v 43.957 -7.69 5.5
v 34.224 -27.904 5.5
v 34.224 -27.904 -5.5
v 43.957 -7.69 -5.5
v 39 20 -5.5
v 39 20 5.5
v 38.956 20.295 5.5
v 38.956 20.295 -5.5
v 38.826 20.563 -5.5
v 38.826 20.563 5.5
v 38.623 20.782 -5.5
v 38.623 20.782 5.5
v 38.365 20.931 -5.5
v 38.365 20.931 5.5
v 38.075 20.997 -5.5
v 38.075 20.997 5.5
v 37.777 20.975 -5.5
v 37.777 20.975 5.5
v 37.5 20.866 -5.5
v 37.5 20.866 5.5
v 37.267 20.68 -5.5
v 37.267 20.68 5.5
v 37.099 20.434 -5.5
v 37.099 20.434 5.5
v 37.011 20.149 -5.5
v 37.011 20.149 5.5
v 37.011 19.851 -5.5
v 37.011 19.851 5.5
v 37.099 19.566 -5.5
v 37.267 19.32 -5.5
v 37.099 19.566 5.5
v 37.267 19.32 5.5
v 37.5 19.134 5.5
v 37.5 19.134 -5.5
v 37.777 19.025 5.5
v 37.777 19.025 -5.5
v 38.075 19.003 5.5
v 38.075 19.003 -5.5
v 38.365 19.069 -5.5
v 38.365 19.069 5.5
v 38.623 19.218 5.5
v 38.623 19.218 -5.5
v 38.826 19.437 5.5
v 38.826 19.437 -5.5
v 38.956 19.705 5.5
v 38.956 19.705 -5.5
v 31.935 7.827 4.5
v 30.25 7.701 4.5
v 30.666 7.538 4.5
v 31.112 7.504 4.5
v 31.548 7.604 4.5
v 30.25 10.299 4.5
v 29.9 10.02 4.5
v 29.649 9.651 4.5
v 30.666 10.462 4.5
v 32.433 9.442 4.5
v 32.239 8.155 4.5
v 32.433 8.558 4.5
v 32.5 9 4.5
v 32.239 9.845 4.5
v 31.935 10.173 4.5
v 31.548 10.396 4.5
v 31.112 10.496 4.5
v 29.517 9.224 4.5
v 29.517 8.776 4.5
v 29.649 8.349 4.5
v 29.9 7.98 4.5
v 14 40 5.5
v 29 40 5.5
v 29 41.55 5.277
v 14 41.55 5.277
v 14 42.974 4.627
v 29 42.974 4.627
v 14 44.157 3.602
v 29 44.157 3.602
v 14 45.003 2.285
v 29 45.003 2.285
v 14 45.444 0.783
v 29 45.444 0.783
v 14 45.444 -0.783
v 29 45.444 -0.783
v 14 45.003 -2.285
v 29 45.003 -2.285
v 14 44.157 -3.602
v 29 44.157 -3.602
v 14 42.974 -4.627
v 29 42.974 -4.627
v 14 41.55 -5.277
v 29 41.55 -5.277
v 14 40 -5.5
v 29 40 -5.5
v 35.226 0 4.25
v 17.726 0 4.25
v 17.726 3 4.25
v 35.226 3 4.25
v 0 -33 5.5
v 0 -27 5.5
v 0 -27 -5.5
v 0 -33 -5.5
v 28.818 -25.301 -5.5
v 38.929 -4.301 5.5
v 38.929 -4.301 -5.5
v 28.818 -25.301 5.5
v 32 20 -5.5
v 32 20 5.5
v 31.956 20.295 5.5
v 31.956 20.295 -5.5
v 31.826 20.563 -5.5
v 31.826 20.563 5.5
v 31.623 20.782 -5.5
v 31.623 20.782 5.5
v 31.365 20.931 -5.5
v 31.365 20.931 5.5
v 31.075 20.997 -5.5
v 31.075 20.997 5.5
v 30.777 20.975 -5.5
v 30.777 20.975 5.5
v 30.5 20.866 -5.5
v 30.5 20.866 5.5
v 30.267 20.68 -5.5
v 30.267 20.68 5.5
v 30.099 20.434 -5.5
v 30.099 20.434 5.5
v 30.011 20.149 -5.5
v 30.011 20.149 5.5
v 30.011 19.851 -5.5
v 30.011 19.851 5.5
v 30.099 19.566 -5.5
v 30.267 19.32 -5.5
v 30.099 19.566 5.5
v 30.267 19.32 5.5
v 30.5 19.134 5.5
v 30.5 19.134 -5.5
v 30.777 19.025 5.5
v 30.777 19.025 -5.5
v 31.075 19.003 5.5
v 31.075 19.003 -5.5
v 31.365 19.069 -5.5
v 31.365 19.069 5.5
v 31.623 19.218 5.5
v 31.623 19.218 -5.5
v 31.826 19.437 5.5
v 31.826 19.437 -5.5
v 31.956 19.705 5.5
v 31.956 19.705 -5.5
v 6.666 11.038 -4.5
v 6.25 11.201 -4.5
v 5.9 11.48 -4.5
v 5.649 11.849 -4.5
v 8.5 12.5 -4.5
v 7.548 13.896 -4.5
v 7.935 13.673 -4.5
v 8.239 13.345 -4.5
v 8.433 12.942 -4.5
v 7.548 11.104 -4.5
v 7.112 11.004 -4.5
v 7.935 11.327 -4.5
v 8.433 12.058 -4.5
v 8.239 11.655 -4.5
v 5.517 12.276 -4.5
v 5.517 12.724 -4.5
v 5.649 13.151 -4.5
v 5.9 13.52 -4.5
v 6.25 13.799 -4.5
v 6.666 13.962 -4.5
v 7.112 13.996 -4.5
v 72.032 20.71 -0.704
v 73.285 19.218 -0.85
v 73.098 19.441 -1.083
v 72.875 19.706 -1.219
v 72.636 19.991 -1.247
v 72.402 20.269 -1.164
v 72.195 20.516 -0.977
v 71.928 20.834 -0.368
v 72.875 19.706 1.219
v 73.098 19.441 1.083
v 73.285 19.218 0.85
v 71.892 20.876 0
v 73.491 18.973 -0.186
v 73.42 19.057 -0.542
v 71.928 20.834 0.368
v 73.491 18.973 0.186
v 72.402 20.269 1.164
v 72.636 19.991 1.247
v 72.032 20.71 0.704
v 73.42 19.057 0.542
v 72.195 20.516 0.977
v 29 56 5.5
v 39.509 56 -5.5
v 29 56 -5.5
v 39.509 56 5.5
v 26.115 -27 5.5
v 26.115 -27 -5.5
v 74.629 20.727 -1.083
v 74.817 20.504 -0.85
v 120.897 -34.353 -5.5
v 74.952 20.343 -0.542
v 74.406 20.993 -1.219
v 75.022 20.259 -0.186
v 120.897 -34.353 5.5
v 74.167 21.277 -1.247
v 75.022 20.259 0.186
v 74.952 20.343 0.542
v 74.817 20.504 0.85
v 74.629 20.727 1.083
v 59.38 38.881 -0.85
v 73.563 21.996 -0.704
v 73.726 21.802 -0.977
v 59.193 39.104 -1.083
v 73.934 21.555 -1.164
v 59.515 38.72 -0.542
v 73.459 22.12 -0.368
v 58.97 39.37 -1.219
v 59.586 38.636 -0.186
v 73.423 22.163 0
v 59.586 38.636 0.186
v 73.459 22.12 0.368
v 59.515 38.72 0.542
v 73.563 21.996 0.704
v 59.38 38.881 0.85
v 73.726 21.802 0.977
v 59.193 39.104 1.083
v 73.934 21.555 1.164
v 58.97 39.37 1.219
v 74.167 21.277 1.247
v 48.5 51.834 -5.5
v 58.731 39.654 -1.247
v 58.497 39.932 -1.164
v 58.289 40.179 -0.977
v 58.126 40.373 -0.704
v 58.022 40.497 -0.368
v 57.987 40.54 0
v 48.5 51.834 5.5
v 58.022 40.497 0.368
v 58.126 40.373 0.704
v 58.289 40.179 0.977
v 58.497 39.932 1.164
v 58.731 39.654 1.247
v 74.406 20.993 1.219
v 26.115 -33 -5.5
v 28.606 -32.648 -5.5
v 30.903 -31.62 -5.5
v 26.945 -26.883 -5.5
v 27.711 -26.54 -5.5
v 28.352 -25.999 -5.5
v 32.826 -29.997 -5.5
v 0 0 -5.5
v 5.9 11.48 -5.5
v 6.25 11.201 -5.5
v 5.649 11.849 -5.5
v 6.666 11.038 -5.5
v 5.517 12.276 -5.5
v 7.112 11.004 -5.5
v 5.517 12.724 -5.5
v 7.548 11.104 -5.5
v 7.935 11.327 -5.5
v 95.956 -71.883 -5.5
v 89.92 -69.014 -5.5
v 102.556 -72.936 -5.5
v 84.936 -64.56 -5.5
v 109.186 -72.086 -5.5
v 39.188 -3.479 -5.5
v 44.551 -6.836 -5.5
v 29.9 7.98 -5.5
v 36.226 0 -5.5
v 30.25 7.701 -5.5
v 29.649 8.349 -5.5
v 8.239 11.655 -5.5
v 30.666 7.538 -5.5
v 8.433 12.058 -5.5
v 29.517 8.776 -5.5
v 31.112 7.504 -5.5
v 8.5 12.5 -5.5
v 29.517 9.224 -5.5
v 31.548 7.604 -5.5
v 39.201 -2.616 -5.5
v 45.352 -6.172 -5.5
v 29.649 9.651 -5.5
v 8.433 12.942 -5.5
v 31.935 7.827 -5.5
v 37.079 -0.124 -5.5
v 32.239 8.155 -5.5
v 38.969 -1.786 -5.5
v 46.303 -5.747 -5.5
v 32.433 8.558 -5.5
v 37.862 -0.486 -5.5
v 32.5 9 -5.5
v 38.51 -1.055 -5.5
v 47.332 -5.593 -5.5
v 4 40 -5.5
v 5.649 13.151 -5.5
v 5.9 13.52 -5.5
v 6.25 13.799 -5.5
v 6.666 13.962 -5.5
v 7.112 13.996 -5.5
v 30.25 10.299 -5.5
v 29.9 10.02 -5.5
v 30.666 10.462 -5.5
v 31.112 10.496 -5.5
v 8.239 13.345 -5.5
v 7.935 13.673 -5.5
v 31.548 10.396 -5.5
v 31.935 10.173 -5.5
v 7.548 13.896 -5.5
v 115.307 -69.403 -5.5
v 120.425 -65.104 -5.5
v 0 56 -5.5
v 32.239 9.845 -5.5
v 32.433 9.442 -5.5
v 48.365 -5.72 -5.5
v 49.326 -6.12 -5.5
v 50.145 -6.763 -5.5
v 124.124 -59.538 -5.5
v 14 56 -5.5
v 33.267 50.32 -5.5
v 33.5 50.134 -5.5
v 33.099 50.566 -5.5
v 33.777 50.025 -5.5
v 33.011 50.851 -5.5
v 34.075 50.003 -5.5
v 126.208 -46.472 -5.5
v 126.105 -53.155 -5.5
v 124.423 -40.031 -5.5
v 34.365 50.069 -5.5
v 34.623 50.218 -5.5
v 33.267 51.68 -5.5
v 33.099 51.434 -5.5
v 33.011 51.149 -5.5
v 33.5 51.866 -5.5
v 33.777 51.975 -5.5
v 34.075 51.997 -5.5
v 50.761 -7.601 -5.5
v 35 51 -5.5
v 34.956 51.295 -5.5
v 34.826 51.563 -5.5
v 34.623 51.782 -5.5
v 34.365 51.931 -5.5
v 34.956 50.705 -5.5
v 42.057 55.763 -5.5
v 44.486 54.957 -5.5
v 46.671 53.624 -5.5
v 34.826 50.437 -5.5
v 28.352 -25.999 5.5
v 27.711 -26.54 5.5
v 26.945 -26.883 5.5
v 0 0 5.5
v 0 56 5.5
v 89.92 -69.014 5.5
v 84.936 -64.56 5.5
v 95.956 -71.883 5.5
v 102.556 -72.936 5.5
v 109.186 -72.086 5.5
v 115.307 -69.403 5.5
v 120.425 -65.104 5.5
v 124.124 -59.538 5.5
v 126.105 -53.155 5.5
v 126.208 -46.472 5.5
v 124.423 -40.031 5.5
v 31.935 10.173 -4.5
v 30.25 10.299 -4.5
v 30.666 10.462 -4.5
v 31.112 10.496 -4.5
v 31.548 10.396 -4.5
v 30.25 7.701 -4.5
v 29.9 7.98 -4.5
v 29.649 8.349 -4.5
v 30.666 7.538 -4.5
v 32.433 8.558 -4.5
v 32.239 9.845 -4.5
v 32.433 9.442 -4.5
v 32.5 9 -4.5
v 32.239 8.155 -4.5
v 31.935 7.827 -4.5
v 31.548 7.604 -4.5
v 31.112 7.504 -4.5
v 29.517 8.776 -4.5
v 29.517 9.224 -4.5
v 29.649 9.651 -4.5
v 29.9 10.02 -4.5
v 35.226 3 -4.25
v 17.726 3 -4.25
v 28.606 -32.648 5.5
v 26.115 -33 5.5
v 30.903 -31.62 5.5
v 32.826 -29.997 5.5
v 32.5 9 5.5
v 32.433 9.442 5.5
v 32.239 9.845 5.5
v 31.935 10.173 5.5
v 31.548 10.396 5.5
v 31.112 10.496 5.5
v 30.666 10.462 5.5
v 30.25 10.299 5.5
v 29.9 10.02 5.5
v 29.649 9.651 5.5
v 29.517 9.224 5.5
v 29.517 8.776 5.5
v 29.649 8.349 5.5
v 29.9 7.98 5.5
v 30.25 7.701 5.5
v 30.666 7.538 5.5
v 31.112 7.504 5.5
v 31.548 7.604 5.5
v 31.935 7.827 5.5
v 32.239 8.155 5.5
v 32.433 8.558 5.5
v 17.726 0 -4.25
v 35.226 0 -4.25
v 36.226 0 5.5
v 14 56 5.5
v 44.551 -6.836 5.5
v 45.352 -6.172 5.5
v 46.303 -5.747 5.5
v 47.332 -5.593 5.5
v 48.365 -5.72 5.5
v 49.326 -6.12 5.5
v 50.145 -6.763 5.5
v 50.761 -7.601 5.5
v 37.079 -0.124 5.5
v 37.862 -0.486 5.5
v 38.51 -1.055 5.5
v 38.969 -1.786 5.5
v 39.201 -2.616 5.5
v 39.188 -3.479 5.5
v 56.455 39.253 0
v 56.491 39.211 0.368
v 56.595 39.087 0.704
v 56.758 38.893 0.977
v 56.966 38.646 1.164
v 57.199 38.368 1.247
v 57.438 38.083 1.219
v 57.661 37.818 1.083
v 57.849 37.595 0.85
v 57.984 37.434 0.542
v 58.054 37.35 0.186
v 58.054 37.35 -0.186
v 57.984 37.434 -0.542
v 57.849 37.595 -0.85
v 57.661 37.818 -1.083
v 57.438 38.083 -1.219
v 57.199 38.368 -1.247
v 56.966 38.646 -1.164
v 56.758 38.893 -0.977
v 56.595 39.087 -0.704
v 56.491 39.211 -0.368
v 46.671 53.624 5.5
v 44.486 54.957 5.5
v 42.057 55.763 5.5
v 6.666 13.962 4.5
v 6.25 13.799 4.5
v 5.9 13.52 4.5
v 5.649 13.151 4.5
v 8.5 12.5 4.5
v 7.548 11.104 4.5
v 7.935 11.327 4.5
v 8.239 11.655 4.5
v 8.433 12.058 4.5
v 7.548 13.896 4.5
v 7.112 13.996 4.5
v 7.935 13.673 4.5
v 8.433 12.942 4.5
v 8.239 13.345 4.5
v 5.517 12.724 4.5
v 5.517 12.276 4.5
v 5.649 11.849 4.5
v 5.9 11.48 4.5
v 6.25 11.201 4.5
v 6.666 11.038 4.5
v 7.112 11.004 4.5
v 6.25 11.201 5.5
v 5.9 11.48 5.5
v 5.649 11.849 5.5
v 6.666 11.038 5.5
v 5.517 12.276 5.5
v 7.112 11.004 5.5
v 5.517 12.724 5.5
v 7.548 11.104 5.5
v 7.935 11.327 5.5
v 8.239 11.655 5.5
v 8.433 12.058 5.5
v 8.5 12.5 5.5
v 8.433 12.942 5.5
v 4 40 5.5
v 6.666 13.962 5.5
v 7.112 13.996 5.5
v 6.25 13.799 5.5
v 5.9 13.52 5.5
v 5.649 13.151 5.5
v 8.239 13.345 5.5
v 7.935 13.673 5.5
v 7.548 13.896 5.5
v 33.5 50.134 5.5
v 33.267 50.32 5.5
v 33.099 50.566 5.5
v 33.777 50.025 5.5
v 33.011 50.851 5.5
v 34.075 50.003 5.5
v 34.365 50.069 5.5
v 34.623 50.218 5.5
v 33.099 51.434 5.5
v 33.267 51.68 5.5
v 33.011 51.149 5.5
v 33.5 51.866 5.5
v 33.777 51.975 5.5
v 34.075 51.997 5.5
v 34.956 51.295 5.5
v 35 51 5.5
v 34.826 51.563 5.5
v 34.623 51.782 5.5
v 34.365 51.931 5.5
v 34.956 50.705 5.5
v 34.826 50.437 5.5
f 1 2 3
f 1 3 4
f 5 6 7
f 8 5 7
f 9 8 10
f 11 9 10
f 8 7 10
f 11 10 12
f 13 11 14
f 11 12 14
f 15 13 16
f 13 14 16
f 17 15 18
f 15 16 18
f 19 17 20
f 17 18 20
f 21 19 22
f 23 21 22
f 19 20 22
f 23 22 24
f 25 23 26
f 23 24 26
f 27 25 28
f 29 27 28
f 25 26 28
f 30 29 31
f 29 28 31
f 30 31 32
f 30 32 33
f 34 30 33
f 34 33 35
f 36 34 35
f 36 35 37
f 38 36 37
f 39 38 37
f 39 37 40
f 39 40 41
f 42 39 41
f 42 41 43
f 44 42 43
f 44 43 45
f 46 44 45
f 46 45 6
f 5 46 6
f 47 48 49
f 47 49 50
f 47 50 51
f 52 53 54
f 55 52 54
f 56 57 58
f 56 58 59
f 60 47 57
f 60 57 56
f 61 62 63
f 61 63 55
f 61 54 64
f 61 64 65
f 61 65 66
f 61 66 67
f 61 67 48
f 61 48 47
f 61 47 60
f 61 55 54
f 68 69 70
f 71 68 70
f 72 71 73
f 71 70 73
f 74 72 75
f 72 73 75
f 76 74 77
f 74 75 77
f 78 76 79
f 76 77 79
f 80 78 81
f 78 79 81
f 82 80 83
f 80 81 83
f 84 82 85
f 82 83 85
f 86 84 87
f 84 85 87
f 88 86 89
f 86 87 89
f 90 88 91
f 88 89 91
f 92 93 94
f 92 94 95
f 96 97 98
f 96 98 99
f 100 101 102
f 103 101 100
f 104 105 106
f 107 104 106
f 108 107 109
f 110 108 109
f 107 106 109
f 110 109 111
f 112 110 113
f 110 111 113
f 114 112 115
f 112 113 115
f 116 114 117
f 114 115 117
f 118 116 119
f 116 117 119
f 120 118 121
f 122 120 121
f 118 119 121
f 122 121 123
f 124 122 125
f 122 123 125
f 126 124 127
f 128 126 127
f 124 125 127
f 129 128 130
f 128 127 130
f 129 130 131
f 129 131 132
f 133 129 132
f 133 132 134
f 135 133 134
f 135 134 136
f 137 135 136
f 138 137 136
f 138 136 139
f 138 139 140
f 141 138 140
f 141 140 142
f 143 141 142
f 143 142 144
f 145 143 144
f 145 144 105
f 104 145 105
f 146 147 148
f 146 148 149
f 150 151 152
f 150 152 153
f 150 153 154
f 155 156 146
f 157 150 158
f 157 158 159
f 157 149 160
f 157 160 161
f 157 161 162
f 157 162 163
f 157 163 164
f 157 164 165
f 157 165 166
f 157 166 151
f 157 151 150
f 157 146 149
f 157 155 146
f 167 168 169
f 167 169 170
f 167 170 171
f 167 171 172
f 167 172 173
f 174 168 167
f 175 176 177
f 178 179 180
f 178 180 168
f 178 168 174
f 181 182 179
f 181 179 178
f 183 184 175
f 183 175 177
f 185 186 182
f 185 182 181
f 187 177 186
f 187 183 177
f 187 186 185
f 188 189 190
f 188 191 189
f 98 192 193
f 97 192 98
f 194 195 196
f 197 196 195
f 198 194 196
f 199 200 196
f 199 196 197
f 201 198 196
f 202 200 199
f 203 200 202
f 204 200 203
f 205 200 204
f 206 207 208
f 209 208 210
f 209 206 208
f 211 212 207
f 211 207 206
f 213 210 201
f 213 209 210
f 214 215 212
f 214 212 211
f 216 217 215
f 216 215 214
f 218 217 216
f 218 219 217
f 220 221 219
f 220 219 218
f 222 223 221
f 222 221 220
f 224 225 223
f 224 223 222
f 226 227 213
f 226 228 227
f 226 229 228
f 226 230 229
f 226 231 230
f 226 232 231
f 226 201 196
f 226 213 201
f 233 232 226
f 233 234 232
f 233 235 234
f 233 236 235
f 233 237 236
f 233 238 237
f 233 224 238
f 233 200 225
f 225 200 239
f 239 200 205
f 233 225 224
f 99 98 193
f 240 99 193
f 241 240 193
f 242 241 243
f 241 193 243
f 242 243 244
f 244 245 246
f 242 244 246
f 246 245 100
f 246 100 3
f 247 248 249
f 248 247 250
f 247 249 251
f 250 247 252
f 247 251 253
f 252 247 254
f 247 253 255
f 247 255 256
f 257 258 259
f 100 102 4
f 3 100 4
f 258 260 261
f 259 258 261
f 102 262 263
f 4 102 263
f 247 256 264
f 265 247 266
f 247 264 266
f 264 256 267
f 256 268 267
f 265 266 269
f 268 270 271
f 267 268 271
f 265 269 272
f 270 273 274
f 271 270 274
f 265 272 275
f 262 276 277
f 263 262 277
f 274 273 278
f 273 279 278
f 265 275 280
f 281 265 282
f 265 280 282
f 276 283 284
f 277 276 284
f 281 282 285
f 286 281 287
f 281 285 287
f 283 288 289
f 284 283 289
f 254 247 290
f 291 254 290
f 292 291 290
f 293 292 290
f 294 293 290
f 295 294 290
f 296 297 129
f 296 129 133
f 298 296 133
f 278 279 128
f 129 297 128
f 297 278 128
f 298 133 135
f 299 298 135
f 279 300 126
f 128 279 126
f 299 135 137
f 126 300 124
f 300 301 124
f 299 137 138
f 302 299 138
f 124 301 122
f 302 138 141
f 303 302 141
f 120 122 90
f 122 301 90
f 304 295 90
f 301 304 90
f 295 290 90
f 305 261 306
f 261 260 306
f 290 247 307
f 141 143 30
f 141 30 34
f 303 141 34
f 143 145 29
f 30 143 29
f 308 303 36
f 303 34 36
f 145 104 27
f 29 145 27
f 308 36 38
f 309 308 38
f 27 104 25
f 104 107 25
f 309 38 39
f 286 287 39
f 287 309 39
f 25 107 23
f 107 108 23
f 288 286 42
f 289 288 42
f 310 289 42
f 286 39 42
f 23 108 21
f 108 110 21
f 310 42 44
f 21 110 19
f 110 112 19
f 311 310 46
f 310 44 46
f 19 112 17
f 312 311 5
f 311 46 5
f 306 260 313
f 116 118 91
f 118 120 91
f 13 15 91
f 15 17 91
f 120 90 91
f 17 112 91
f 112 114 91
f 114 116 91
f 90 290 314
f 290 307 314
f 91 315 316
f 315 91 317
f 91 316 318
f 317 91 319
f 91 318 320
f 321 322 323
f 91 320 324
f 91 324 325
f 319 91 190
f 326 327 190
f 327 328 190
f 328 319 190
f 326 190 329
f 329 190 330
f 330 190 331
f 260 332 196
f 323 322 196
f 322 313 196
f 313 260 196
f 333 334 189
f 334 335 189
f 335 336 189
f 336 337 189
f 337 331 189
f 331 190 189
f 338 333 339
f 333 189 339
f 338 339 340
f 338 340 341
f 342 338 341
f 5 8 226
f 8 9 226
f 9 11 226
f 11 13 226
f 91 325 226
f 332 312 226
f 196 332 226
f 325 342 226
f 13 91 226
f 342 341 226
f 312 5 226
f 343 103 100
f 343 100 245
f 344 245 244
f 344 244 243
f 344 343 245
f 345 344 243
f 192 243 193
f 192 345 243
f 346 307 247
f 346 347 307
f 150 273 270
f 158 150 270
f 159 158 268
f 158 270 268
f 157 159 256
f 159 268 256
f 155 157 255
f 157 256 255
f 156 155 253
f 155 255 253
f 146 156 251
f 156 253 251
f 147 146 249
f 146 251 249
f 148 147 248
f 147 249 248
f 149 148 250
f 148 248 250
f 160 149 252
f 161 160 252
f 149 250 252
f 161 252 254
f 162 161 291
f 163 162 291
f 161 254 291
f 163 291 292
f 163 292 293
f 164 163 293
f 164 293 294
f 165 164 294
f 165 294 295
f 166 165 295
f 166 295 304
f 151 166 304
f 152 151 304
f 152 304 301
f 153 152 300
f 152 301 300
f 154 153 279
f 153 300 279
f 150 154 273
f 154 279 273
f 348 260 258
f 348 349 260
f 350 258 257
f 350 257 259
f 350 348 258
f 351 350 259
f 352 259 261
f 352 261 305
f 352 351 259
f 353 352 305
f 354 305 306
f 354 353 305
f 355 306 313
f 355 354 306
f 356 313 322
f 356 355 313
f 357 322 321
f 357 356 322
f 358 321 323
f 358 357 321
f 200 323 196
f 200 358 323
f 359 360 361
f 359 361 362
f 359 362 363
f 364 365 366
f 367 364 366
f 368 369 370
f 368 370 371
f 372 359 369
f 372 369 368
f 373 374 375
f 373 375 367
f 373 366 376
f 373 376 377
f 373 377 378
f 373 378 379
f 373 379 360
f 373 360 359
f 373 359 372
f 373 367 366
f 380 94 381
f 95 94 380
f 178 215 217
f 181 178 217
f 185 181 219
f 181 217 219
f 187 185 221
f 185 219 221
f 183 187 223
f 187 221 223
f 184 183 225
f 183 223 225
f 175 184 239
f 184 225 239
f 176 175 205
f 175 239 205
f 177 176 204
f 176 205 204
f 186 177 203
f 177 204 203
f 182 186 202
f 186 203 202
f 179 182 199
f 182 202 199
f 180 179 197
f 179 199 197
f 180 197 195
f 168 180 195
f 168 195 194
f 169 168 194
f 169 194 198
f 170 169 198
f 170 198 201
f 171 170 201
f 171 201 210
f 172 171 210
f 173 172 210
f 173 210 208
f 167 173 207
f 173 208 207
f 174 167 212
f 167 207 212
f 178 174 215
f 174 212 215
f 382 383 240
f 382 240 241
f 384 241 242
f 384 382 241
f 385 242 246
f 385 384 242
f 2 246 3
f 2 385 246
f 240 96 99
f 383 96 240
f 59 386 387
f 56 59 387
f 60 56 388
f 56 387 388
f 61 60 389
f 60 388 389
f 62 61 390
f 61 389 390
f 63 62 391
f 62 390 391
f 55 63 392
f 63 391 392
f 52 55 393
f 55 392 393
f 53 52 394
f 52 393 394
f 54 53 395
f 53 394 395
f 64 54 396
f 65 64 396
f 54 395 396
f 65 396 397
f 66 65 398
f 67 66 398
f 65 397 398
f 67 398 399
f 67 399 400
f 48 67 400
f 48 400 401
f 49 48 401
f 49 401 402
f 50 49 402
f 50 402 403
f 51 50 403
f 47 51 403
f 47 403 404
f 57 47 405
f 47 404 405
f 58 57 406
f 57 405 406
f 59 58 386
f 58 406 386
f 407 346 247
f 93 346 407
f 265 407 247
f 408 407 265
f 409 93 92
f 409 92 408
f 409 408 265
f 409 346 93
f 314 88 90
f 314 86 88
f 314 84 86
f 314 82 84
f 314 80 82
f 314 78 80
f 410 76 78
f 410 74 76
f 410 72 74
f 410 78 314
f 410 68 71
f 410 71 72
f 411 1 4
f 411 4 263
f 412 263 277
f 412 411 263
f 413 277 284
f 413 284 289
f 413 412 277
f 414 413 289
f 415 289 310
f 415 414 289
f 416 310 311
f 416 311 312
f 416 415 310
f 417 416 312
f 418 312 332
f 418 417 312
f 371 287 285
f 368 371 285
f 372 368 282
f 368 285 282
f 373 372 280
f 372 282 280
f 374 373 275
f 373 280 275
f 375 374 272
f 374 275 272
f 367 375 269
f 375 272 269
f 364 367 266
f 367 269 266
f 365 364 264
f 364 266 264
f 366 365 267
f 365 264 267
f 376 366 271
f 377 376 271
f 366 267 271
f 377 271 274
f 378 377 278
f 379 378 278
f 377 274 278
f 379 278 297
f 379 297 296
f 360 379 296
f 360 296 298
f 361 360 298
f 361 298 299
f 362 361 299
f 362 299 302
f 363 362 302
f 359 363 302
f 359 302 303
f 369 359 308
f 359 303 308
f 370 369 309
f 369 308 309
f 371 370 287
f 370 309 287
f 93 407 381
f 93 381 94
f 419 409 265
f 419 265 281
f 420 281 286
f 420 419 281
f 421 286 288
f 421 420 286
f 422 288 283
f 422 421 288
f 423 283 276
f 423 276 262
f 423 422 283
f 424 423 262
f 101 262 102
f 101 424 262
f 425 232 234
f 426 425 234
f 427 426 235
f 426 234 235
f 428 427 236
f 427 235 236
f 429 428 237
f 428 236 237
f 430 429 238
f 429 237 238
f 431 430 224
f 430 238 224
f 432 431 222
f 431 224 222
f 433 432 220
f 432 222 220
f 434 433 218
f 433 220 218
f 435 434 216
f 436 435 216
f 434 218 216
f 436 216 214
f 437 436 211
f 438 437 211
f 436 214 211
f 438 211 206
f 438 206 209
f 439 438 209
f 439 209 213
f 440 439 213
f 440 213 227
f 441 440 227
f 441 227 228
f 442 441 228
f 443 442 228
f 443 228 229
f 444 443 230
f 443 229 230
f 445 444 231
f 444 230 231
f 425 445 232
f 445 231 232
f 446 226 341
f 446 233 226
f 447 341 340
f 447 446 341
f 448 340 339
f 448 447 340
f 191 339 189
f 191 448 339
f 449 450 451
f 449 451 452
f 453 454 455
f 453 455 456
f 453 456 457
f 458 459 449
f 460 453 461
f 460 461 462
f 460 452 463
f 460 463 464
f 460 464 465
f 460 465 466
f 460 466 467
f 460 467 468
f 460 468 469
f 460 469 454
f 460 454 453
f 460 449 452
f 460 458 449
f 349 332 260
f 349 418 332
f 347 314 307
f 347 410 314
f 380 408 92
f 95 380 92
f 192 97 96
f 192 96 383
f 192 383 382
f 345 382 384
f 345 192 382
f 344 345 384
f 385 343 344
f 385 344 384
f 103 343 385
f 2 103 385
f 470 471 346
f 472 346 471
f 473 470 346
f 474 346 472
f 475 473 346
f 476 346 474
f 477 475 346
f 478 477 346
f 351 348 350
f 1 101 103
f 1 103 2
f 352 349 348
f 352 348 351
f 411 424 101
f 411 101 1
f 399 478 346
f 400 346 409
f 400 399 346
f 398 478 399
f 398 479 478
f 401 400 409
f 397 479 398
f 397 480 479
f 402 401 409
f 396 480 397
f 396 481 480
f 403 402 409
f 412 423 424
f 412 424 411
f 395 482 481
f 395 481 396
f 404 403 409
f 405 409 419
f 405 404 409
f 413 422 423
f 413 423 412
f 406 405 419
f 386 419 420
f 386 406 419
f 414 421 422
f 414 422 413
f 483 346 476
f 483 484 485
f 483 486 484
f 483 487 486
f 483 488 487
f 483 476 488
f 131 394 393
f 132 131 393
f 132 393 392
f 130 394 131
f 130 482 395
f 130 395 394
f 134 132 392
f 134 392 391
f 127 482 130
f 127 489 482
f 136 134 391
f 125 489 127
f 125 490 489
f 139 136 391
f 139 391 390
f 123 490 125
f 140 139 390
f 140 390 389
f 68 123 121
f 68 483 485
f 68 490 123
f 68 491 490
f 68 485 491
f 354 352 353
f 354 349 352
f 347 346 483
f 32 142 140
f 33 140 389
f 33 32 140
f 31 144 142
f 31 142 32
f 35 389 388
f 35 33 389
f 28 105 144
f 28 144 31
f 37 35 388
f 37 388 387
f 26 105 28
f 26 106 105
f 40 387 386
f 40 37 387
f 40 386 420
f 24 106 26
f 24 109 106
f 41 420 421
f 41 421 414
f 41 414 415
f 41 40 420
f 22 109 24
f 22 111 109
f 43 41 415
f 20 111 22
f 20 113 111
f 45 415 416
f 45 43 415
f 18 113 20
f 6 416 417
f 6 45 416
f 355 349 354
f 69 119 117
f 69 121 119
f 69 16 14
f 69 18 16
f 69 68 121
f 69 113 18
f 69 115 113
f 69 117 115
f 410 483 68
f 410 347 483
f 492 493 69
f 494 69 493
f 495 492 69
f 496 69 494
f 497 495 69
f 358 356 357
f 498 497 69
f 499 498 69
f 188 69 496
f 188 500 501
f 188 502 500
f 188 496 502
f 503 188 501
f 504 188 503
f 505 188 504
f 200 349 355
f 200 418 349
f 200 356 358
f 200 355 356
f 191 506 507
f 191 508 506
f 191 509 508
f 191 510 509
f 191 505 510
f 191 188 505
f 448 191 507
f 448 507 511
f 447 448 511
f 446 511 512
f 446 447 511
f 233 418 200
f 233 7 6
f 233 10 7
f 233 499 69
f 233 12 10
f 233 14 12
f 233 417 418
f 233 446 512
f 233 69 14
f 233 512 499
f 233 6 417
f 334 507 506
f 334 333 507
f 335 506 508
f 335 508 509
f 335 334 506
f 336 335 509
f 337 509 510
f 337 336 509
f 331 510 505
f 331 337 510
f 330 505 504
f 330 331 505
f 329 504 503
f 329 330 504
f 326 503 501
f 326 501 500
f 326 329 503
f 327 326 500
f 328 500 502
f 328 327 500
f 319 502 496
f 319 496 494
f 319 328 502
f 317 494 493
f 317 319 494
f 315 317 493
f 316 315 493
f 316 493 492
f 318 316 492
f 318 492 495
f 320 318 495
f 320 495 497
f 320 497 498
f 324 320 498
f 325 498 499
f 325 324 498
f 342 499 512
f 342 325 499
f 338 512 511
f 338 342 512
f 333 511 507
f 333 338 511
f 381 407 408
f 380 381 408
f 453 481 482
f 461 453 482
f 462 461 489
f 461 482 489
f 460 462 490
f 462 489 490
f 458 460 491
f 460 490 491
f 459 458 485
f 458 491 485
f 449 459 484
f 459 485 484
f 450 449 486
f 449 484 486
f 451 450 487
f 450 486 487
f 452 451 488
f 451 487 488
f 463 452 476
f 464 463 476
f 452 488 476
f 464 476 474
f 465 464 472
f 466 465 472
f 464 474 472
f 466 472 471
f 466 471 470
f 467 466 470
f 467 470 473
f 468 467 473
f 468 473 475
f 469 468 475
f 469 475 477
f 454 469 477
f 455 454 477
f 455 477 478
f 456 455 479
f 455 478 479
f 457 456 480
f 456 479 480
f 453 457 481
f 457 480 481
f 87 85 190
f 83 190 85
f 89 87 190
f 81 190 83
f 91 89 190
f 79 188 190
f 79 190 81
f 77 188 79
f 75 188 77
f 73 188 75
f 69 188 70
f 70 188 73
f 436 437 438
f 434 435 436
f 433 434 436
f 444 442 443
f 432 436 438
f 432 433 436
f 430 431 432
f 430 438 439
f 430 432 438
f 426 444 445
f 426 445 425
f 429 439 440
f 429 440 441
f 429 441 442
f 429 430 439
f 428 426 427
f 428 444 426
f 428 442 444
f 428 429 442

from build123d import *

# Parameters (mm, degrees)
F0_R      = 1
F1_DEPTH  = 5.5
F3_DEPTH  = 25
F4_R      = 1
F5_DEPTH  = 11.001
F6_W      = 17.5
F6_H      = 8.5
F7_DEPTH  = 3
F8_R      = 1.25
F9_DEPTH  = 2
F10_R     = 1.5
F11_DEPTH = 1
F12_R     = 1.5
F13_DEPTH = 1


with BuildPart() as f1:
    # F0 (on Top) → F1 (new body, symmetric)
    with BuildSketch(Plane.XY):
        with BuildLine():
            Line((0, 56), (0, 0))
            Line((0, 0), (36.2259279858, 0))
            ThreePointArc((36.2259279858, 0), (38.7660402441, -1.4038077448), (38.9289329951, -4.3014468563))
            Line((38.9289329951, -4.3014468563), (28.817821884, -25.3014468563))
            ThreePointArc((28.817821884, -25.3014468563), (27.7110091299, -26.5401122582), (26.1148168747, -27))
            Line((26.1148168747, -27), (0, -27))
            Line((0, -27), (0, -33))
            Line((0, -33), (26.1148168747, -33))
            ThreePointArc((26.1148168747, -33), (30.9033936403, -31.6203367747), (34.2238319025, -27.904340569))
            Line((34.2238319025, -27.904340569), (43.9565924234, -7.690145641))
            ThreePointArc((43.9565924234, -7.690145641), (47.3319268627, -5.59281579), (50.7608266635, -7.6013777725))
            Line((50.7608266635, -7.6013777725), (84.9360533184, -64.560088864))
            ThreePointArc((84.9360533184, -64.560088864), (118.0198171676, -67.4369378944), (120.8966661979, -34.3531740452))
            Line((120.8966661979, -34.3531740452), (48.4995788875, 51.8338346577))
            ThreePointArc((48.4995788875, 51.8338346577), (44.4862343011, 54.9569066089), (39.5090393722, 56))
            Line((39.5090393722, 56), (29, 56))
            Line((29, 56), (29, 40))
            Line((29, 40), (14, 40))
            Line((14, 40), (14, 56))
            Line((14, 56), (0, 56))
        make_face()
        with Locations((34, 51)):
            Circle(F0_R, mode=Mode.SUBTRACT)
    extrude(amount=F1_DEPTH, both=True)

    # F2 (on face) → F3 (join)
    with BuildSketch(Plane(origin=(29, 0, 0), x_dir=(0, -1, 0), z_dir=(-1, 0, 0))):
        with BuildLine():
            ThreePointArc((-40, 5.5), (-45.5, 0), (-40, -5.5))
            Line((-40, -5.5), (-40, 5.5))
        make_face()
    extrude(amount=F3_DEPTH)

    # F4 (on face) → F5 (cut, through all)
    with BuildSketch(Plane.XY.offset(5.5)):
        with Locations((31, 20)):
            Circle(F4_R)
        with Locations((38, 20)):
            Circle(F4_R)
    extrude(amount=-F5_DEPTH, mode=Mode.SUBTRACT)

    # F6 (on face) → F7 (cut)
    with BuildSketch(Plane.XZ):
        with Locations((26.4759279858, 0)):
            Rectangle(F6_W, F6_H)
    extrude(amount=-F7_DEPTH, mode=Mode.SUBTRACT)

    # F8 (on face) → F9 (cut)
    with BuildSketch(Plane(origin=(53.9634146341, 45.3292682927, 0), x_dir=(-0.6431920864, 0.7657048648, 0), z_dir=(0.7657048648, 0.6431920864, 0))):
        with Locations((-31.5051259772, 0)):
            Circle(F8_R)
        with Locations((-7.5051259772, 0)):
            Circle(F8_R)
    extrude(amount=-F9_DEPTH, mode=Mode.SUBTRACT)

    # F10 (on face) → F11 (cut)
    with BuildSketch(Plane.XY.offset(5.5)):
        with Locations((7, 12.5)):
            Circle(F10_R)
        with Locations((31, 9)):
            Circle(F10_R)
    extrude(amount=-F11_DEPTH, mode=Mode.SUBTRACT)

    # F12 (on face) → F13 (cut)
    with BuildSketch(Plane(origin=(0, 0, -5.5), x_dir=(1, 0, 0), z_dir=(0, 0, -1))):
        with Locations((7, -12.5)):
            Circle(F12_R)
        with Locations((31, -9)):
            Circle(F12_R)
    extrude(amount=-F13_DEPTH, mode=Mode.SUBTRACT)


solid = f1.part
